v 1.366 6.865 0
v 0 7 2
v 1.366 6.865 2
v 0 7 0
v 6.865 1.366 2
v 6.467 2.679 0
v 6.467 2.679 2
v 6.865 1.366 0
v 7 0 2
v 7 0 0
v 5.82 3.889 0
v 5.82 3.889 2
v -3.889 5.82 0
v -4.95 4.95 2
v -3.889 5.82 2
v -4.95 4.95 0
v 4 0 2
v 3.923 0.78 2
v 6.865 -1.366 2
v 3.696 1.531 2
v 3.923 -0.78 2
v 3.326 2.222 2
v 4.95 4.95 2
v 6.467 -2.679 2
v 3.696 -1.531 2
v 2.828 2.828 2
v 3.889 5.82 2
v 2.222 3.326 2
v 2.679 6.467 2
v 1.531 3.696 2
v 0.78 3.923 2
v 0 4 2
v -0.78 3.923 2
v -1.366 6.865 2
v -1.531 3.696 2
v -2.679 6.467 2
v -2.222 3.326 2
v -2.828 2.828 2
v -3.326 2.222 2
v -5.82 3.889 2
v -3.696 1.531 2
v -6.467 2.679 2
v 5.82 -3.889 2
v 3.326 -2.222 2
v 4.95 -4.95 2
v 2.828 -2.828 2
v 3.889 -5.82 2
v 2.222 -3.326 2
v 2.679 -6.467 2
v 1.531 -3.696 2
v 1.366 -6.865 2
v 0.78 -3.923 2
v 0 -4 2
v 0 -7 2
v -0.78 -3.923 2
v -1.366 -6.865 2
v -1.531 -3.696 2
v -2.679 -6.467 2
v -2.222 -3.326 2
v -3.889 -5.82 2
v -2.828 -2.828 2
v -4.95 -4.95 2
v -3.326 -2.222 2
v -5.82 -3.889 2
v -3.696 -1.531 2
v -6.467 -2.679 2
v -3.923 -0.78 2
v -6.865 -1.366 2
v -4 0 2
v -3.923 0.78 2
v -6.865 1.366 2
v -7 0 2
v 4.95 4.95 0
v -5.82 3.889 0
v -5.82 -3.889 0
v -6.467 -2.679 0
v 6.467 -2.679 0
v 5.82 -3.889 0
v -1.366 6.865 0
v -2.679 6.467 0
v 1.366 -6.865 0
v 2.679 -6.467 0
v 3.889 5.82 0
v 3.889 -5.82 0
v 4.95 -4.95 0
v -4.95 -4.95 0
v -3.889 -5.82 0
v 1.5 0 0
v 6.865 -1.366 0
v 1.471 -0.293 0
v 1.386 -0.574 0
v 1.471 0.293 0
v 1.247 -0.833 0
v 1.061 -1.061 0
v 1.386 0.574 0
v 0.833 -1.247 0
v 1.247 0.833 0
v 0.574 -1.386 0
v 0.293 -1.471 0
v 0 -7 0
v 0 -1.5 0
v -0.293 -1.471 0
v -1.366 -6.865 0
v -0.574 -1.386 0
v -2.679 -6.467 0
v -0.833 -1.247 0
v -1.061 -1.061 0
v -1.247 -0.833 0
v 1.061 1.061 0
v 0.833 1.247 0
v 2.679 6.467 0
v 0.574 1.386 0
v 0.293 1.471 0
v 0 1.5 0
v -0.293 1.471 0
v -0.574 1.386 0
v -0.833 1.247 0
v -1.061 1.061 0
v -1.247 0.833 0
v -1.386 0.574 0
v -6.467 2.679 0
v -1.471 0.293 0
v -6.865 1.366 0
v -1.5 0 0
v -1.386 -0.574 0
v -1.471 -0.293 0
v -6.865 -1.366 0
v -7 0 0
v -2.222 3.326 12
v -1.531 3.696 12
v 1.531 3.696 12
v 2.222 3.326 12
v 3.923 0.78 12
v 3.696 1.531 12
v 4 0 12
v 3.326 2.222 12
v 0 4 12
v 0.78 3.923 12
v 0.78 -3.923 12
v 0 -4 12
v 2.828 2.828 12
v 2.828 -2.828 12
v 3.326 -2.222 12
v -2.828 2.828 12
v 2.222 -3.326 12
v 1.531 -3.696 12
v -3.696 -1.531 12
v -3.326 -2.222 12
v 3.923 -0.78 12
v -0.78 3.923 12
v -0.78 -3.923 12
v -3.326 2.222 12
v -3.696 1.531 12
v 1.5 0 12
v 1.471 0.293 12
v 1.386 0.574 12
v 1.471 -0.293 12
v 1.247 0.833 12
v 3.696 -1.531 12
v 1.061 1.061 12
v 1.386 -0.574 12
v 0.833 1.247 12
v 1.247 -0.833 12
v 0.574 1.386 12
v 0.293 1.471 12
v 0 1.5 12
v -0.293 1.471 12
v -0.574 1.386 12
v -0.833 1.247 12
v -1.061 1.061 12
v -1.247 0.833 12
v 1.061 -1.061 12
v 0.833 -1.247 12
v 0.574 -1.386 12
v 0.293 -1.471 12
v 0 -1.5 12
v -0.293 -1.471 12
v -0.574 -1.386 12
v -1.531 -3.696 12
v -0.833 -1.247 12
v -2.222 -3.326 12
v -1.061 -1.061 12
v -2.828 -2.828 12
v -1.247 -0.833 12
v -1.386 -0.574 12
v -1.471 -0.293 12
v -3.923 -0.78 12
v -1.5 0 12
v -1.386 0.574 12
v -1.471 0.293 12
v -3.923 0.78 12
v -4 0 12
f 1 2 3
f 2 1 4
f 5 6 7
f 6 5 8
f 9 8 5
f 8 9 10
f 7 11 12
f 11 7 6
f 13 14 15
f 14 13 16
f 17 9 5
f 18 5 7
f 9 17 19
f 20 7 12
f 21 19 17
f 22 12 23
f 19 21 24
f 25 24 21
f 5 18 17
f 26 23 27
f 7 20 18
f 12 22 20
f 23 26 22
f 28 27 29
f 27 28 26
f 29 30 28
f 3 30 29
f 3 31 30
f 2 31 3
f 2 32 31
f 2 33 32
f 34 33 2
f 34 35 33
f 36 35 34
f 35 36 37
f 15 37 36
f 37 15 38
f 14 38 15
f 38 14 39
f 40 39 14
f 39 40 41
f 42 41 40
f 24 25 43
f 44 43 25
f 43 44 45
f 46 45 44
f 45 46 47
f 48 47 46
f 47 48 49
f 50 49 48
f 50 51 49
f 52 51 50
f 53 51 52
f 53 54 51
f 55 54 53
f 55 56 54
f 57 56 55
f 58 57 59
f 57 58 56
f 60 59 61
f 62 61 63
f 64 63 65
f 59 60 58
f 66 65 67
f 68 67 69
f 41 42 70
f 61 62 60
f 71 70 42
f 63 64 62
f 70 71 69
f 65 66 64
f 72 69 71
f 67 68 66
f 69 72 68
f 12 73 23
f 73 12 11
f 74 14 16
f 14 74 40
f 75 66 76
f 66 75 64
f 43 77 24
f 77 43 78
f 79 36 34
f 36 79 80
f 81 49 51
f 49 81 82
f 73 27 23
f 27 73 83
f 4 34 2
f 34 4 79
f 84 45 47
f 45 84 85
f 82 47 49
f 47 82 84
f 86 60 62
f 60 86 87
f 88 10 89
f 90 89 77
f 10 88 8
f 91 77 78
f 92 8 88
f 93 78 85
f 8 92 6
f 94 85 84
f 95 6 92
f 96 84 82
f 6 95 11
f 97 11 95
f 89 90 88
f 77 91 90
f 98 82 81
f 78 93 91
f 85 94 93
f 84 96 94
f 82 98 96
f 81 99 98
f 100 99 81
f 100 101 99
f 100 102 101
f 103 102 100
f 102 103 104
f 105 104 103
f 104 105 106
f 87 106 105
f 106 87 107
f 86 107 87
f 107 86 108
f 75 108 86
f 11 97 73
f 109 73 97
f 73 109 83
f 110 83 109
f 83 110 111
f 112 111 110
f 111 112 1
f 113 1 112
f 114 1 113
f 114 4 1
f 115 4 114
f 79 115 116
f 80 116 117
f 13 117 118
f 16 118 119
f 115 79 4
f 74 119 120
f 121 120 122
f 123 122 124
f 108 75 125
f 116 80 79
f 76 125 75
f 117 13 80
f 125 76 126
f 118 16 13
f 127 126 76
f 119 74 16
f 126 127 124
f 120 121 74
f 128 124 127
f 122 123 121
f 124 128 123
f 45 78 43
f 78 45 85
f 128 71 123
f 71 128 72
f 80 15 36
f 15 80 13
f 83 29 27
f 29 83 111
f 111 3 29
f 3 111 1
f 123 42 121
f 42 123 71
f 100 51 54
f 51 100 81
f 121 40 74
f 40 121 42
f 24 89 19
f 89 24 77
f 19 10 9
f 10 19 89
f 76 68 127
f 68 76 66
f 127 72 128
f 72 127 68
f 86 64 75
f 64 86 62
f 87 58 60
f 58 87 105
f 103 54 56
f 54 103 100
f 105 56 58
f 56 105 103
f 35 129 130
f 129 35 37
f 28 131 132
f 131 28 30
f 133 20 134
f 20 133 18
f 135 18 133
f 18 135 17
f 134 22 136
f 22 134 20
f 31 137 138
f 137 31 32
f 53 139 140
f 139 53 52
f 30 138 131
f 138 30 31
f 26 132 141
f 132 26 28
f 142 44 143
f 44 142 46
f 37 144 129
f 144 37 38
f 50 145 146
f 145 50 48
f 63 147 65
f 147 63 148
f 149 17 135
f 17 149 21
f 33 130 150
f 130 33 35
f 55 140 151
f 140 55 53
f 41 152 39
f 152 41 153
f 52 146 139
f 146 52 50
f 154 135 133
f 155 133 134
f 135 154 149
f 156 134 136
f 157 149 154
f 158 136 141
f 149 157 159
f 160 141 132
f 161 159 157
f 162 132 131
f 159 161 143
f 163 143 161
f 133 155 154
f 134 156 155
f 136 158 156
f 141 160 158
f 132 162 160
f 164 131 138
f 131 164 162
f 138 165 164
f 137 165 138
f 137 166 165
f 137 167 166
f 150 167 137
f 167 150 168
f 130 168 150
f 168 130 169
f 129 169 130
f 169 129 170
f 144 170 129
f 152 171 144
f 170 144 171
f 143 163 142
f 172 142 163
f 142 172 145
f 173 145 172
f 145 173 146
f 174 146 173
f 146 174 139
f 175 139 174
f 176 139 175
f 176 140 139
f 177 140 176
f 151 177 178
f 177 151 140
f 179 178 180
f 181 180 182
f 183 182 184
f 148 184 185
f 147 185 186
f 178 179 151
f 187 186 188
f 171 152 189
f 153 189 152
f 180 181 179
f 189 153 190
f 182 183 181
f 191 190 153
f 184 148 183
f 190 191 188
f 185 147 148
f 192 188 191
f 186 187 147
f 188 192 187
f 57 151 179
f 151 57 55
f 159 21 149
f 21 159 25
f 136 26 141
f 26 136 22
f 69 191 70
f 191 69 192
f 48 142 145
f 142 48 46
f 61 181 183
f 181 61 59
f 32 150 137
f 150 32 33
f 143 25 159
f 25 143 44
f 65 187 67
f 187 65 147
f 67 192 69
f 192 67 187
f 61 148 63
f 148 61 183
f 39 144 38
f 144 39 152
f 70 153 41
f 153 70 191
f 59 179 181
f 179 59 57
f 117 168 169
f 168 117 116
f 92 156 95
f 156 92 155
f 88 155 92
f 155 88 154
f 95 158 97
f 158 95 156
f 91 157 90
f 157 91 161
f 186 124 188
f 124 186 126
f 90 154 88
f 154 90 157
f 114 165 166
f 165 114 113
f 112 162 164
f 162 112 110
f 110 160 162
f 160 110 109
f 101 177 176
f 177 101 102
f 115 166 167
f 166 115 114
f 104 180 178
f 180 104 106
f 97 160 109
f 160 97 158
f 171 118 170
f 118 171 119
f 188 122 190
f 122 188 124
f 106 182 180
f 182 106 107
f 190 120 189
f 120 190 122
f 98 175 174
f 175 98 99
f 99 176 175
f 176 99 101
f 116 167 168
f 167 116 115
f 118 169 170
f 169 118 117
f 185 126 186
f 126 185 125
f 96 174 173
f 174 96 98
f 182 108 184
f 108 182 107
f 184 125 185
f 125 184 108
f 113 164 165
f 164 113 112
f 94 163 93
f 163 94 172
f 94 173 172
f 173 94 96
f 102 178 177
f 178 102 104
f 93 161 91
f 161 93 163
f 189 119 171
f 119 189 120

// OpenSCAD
$fn = 32;

// ----------------------------------------------------------------------
// Micro post: flanged post, 5-20 mm class
// ----------------------------------------------------------------------

// --- parameters (mm) ---
post_d = 8;               // post diameter
post_h = 10;              // post height above the flange
flange_d = 14;            // flange diameter
flange_t = 2;             // flange thickness
bore_d = 3;               // through bore

total_h = post_h + flange_t;  // overall height

difference() {
  union() {
    cylinder(h = flange_t, d = flange_d);
    translate([0, 0, flange_t]) cylinder(h = post_h, d = post_d);
  }
  translate([0, 0, -1]) cylinder(h = total_h + 2, d = bore_d);
}
